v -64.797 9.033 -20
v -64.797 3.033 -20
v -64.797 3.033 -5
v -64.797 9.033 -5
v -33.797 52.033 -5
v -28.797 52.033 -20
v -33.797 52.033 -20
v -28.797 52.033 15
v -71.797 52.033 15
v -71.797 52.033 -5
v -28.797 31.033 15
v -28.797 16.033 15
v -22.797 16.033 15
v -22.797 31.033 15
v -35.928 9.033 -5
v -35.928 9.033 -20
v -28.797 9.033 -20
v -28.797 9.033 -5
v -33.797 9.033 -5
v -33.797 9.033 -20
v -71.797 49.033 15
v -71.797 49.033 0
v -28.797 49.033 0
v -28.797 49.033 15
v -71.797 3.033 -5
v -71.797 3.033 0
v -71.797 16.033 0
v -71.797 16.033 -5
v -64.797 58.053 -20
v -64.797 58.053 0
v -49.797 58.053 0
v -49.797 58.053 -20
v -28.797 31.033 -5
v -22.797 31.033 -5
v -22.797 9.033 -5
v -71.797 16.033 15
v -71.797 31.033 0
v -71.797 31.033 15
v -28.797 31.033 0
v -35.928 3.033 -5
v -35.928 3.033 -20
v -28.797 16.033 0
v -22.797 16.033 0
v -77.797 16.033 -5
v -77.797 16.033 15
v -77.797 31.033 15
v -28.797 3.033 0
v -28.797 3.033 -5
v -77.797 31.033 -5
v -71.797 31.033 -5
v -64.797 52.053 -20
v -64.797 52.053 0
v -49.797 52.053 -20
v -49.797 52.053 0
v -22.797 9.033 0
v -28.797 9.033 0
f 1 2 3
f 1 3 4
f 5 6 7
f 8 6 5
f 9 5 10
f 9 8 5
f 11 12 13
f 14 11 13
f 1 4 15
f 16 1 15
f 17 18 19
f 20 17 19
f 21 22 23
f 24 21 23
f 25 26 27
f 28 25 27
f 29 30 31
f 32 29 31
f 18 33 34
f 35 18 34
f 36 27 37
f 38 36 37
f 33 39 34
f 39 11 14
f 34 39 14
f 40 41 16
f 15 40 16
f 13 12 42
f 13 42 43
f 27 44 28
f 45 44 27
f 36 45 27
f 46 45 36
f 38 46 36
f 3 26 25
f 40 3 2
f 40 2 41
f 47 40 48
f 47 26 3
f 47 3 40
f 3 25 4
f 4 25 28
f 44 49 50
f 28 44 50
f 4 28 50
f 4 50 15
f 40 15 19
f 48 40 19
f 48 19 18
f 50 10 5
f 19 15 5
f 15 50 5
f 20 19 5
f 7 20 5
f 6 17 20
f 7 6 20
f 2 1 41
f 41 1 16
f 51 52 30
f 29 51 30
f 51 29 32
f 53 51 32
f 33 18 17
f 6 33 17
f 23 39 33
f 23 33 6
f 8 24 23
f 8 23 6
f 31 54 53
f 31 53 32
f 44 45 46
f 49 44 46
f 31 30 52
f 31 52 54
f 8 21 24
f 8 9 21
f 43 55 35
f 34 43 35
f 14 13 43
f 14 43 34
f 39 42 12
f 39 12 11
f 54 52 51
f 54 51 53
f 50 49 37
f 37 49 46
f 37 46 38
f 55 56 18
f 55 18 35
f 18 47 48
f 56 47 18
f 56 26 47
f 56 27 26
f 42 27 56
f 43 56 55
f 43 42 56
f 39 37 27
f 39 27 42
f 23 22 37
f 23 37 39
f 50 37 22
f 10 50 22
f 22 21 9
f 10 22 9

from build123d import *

# Parameters (mm, degrees)
SKETCH_1_W          = 6
SKETCH_1_H          = 15
EXTRUDE_3_DEPTH     = 15
SKETCH_1_7_W        = 6
SKETCH_1_7_H        = 15
EXTRUDE_3_2_DEPTH   = 15
EXTRUDE_4_DEPTH     = 15
SKETCH_1_11_W       = 18
SKETCH_1_11_H       = 18
SKETCH_1_11_W_2     = 6
SKETCH_1_11_H_2     = 15
SKETCH_1_11_W_3     = 15
SKETCH_1_11_H_3     = 6
SKETCH_1_11_W_4     = 7
EXTRUDE_5_DEPTH     = 5
SKETCH_1_13_W       = 3
SKETCH_1_13_H       = 40
EXTRUDE_10_DEPTH    = 20
SKETCH_3_W          = 14.869090603
SKETCH_3_H          = 6
EXTRUDE_15_DEPTH    = 15
SKETCH_4_W          = 22
SKETCH_4_H          = 6
SKETCH_4_W_2        = 7
CUT_EXTRUDE_2_DEPTH = 100.096671025
SKETCH_8_W          = 14.869090603
SKETCH_8_H          = 6
CUT_EXTRUDE_3_DEPTH = 104.17533721
SKETCH_10_W         = 15
SKETCH_10_H         = 6
EXTRUDE_16_DEPTH    = 20
SKETCH_15_W         = 7
SKETCH_15_H         = 6
EXTRUDE_17_DEPTH    = 5
SKETCH_16_W         = 15
SKETCH_16_H         = 6
EXTRUDE_18_DEPTH    = 20
SKETCH_17_W         = 3
SKETCH_17_H         = 40
CUT_EXTRUDE_5_DEPTH = 100.108727035
SKETCH_18_W         = 5
SKETCH_18_H         = 43
EXTRUDE_19_DEPTH    = 15


with BuildPart() as part:
    # 草图1 → Extrude 3 (new body)
    with BuildSketch(Plane.XY):
        with Locations((-25.796959303, 23.532605762)):
            Rectangle(SKETCH_1_W, SKETCH_1_H)
    extrude(amount=EXTRUDE_3_DEPTH)



with BuildPart() as body_2:
    # 草图1<7> → Extrude 3 2 (new body)
    with BuildSketch(Plane.XY):
        with Locations((-74.796959303, 23.532605762)):
            Rectangle(SKETCH_1_7_W, SKETCH_1_7_H)
    extrude(amount=EXTRUDE_3_2_DEPTH)


with BuildPart() as body_3:
    # 草图1<8> → 凸台-拉伸4 (new body)
    with BuildSketch(Plane.XY):
        Polygon((-71.796959303, 49.032605762), (-68.796959303, 49.032605762), (-50.796959303, 49.032605762), (-28.796959303, 49.032605762), (-28.796959303, 52.032605762), (-35.796959303, 52.032605762), (-50.796959303, 52.032605762), (-71.796959303, 52.032605762), align=None)
    extrude(amount=EXTRUDE_4_DEPTH)


with BuildPart() as part_1:
    add(part.part)

    add(body_2.part)  # 凸台-拉伸5 merges body 2

    add(body_3.part)  # 凸台-拉伸5 merges body 3
    # 草图1<11> → 凸台-拉伸5 (add)
    with BuildSketch(Plane.XY):
        Polygon((-68.796959303, 9.032605762), (-50.796959303, 9.032605762), (-35.796959303, 9.032605762), (-35.796959303, 3.032605762), (-28.796959303, 3.032605762), (-28.796959303, 9.032605762), (-22.796959303, 9.032605762), (-22.796959303, 16.032605762), (-28.796959303, 16.032605762), (-28.796959303, 31.032605762), (-28.796959303, 49.032605762), (-50.796959303, 49.032605762), (-50.796959303, 31.032605762), (-68.796959303, 31.032605762), align=None)
        with Locations((-59.796959303, 40.032605762)):
            Rectangle(SKETCH_1_11_W, SKETCH_1_11_H)
        with Locations((-25.796959303, 23.532605762)):
            Rectangle(SKETCH_1_11_W_2, SKETCH_1_11_H_2)
        with Locations((-74.796959303, 23.532605762)):
            Rectangle(SKETCH_1_11_W_2, SKETCH_1_11_H_2)
        Polygon((-71.796959303, 9.032605762), (-68.796959303, 9.032605762), (-68.796959303, 31.032605762), (-68.796959303, 49.032605762), (-71.796959303, 49.032605762), (-71.796959303, 31.032605762), (-71.796959303, 16.032605762), align=None)
        Polygon((-71.796959303, 49.032605762), (-68.796959303, 49.032605762), (-50.796959303, 49.032605762), (-28.796959303, 49.032605762), (-28.796959303, 52.032605762), (-35.796959303, 52.032605762), (-50.796959303, 52.032605762), (-71.796959303, 52.032605762), align=None)
        with Locations((-43.296959303, 55.032605762)):
            Rectangle(SKETCH_1_11_W_3, SKETCH_1_11_H_3)
        with Locations((-32.296959303, 55.032605762)):
            Rectangle(SKETCH_1_11_W_4, SKETCH_1_11_H_3)
        with Locations((-43.296959303, 6.032605762)):
            Rectangle(SKETCH_1_11_W_3, SKETCH_1_11_H_3)
    extrude(amount=-EXTRUDE_5_DEPTH)

    # 草图1<13> → 凸台-拉伸10 (add)
    with BuildSketch(Plane.XY):
        with Locations((-70.296959303, 29.032605762)):
            Rectangle(SKETCH_1_13_W, SKETCH_1_13_H)
    extrude(amount=-EXTRUDE_10_DEPTH)

    # 草图3 → 凸台-拉伸15 (add)
    with BuildSketch(Plane(origin=(0, 0, -5), x_dir=(-1, 0, 0), z_dir=(0, 0, -1))):
        with Locations((43.362414001, 55.032605762)):
            Rectangle(SKETCH_3_W, SKETCH_3_H)
        with Locations((43.362414001, 6.032605762)):
            Rectangle(SKETCH_3_W, SKETCH_3_H)
    extrude(amount=EXTRUDE_15_DEPTH)

    # 草图4 → 切除-拉伸2 (cut, through all)
    with BuildSketch(Plane(origin=(0, 0, -5), x_dir=(-1, 0, 0), z_dir=(0, 0, -1))):
        with Locations((39.796959303, 55.032605762)):
            Rectangle(SKETCH_4_W, SKETCH_4_H)
        with Locations((68.296959303, 55.032605762)):
            Rectangle(SKETCH_4_W_2, SKETCH_4_H)
    extrude(amount=-CUT_EXTRUDE_2_DEPTH, mode=Mode.SUBTRACT)


with BuildPart() as cut_extrude_2_piece_1:
    # of the separate pieces the step leaves, piece 1, a body of its own (cut_extrude_2_pieces)
    add(part_1.part.solids().sort_by_distance((-28.796959303, 31.032605762, 0))[0])

    # 草图15 → 凸台-拉伸17 (add)
    with BuildSketch(Plane.XY):
        with Locations((-68.296959303, 6.032605762)):
            Rectangle(SKETCH_15_W, SKETCH_15_H)
    extrude(amount=-EXTRUDE_17_DEPTH)

    # 草图16 → 凸台-拉伸18 (add)
    with BuildSketch(Plane.XY):
        with Locations((-57.296959303, 6.032605762)):
            Rectangle(SKETCH_16_W, SKETCH_16_H)
    extrude(amount=-EXTRUDE_18_DEPTH)

    # 草图17 → 切除-拉伸5 (cut, through all)
    with BuildSketch(Plane(origin=(0, 0, -5), x_dir=(-1, 0, 0), z_dir=(0, 0, -1))):
        with Locations((70.296959303, 29.032605762)):
            Rectangle(SKETCH_17_W, SKETCH_17_H)
    extrude(amount=CUT_EXTRUDE_5_DEPTH, mode=Mode.SUBTRACT)

    # 草图18 → 凸台-拉伸19 (add)
    with BuildSketch(Plane(origin=(0, 0, -5), x_dir=(-1, 0, 0), z_dir=(0, 0, -1))):
        with Locations((31.296959303, 30.532605762)):
            Rectangle(SKETCH_18_W, SKETCH_18_H)
    extrude(amount=EXTRUDE_19_DEPTH)


with BuildPart() as cut_extrude_2_piece_2:
    # of the separate pieces the step leaves, piece 2, a body of its own (cut_extrude_2_pieces)
    add(part_1.part.solids().sort_by_distance((-50.796959303, 52.032605762, -20))[0])

    # 草图8 → 切除-拉伸3 (cut, through all)
    with BuildSketch(Plane(origin=(0, 0, -20), x_dir=(-1, 0, 0), z_dir=(0, 0, -1))):
        with Locations((43.362414001, 55.032605762)):
            Rectangle(SKETCH_8_W, SKETCH_8_H)
    extrude(amount=-CUT_EXTRUDE_3_DEPTH, mode=Mode.SUBTRACT)


with BuildPart() as body_2_2:
    # 草图10 → 凸台-拉伸16 (new body)
    with BuildSketch(Plane.XY):
        with Locations((-57.296959303, 55.053190245)):
            Rectangle(SKETCH_10_W, SKETCH_10_H)
    extrude(amount=-EXTRUDE_16_DEPTH)


solid = Compound([cut_extrude_2_piece_1.part, body_2_2.part])
